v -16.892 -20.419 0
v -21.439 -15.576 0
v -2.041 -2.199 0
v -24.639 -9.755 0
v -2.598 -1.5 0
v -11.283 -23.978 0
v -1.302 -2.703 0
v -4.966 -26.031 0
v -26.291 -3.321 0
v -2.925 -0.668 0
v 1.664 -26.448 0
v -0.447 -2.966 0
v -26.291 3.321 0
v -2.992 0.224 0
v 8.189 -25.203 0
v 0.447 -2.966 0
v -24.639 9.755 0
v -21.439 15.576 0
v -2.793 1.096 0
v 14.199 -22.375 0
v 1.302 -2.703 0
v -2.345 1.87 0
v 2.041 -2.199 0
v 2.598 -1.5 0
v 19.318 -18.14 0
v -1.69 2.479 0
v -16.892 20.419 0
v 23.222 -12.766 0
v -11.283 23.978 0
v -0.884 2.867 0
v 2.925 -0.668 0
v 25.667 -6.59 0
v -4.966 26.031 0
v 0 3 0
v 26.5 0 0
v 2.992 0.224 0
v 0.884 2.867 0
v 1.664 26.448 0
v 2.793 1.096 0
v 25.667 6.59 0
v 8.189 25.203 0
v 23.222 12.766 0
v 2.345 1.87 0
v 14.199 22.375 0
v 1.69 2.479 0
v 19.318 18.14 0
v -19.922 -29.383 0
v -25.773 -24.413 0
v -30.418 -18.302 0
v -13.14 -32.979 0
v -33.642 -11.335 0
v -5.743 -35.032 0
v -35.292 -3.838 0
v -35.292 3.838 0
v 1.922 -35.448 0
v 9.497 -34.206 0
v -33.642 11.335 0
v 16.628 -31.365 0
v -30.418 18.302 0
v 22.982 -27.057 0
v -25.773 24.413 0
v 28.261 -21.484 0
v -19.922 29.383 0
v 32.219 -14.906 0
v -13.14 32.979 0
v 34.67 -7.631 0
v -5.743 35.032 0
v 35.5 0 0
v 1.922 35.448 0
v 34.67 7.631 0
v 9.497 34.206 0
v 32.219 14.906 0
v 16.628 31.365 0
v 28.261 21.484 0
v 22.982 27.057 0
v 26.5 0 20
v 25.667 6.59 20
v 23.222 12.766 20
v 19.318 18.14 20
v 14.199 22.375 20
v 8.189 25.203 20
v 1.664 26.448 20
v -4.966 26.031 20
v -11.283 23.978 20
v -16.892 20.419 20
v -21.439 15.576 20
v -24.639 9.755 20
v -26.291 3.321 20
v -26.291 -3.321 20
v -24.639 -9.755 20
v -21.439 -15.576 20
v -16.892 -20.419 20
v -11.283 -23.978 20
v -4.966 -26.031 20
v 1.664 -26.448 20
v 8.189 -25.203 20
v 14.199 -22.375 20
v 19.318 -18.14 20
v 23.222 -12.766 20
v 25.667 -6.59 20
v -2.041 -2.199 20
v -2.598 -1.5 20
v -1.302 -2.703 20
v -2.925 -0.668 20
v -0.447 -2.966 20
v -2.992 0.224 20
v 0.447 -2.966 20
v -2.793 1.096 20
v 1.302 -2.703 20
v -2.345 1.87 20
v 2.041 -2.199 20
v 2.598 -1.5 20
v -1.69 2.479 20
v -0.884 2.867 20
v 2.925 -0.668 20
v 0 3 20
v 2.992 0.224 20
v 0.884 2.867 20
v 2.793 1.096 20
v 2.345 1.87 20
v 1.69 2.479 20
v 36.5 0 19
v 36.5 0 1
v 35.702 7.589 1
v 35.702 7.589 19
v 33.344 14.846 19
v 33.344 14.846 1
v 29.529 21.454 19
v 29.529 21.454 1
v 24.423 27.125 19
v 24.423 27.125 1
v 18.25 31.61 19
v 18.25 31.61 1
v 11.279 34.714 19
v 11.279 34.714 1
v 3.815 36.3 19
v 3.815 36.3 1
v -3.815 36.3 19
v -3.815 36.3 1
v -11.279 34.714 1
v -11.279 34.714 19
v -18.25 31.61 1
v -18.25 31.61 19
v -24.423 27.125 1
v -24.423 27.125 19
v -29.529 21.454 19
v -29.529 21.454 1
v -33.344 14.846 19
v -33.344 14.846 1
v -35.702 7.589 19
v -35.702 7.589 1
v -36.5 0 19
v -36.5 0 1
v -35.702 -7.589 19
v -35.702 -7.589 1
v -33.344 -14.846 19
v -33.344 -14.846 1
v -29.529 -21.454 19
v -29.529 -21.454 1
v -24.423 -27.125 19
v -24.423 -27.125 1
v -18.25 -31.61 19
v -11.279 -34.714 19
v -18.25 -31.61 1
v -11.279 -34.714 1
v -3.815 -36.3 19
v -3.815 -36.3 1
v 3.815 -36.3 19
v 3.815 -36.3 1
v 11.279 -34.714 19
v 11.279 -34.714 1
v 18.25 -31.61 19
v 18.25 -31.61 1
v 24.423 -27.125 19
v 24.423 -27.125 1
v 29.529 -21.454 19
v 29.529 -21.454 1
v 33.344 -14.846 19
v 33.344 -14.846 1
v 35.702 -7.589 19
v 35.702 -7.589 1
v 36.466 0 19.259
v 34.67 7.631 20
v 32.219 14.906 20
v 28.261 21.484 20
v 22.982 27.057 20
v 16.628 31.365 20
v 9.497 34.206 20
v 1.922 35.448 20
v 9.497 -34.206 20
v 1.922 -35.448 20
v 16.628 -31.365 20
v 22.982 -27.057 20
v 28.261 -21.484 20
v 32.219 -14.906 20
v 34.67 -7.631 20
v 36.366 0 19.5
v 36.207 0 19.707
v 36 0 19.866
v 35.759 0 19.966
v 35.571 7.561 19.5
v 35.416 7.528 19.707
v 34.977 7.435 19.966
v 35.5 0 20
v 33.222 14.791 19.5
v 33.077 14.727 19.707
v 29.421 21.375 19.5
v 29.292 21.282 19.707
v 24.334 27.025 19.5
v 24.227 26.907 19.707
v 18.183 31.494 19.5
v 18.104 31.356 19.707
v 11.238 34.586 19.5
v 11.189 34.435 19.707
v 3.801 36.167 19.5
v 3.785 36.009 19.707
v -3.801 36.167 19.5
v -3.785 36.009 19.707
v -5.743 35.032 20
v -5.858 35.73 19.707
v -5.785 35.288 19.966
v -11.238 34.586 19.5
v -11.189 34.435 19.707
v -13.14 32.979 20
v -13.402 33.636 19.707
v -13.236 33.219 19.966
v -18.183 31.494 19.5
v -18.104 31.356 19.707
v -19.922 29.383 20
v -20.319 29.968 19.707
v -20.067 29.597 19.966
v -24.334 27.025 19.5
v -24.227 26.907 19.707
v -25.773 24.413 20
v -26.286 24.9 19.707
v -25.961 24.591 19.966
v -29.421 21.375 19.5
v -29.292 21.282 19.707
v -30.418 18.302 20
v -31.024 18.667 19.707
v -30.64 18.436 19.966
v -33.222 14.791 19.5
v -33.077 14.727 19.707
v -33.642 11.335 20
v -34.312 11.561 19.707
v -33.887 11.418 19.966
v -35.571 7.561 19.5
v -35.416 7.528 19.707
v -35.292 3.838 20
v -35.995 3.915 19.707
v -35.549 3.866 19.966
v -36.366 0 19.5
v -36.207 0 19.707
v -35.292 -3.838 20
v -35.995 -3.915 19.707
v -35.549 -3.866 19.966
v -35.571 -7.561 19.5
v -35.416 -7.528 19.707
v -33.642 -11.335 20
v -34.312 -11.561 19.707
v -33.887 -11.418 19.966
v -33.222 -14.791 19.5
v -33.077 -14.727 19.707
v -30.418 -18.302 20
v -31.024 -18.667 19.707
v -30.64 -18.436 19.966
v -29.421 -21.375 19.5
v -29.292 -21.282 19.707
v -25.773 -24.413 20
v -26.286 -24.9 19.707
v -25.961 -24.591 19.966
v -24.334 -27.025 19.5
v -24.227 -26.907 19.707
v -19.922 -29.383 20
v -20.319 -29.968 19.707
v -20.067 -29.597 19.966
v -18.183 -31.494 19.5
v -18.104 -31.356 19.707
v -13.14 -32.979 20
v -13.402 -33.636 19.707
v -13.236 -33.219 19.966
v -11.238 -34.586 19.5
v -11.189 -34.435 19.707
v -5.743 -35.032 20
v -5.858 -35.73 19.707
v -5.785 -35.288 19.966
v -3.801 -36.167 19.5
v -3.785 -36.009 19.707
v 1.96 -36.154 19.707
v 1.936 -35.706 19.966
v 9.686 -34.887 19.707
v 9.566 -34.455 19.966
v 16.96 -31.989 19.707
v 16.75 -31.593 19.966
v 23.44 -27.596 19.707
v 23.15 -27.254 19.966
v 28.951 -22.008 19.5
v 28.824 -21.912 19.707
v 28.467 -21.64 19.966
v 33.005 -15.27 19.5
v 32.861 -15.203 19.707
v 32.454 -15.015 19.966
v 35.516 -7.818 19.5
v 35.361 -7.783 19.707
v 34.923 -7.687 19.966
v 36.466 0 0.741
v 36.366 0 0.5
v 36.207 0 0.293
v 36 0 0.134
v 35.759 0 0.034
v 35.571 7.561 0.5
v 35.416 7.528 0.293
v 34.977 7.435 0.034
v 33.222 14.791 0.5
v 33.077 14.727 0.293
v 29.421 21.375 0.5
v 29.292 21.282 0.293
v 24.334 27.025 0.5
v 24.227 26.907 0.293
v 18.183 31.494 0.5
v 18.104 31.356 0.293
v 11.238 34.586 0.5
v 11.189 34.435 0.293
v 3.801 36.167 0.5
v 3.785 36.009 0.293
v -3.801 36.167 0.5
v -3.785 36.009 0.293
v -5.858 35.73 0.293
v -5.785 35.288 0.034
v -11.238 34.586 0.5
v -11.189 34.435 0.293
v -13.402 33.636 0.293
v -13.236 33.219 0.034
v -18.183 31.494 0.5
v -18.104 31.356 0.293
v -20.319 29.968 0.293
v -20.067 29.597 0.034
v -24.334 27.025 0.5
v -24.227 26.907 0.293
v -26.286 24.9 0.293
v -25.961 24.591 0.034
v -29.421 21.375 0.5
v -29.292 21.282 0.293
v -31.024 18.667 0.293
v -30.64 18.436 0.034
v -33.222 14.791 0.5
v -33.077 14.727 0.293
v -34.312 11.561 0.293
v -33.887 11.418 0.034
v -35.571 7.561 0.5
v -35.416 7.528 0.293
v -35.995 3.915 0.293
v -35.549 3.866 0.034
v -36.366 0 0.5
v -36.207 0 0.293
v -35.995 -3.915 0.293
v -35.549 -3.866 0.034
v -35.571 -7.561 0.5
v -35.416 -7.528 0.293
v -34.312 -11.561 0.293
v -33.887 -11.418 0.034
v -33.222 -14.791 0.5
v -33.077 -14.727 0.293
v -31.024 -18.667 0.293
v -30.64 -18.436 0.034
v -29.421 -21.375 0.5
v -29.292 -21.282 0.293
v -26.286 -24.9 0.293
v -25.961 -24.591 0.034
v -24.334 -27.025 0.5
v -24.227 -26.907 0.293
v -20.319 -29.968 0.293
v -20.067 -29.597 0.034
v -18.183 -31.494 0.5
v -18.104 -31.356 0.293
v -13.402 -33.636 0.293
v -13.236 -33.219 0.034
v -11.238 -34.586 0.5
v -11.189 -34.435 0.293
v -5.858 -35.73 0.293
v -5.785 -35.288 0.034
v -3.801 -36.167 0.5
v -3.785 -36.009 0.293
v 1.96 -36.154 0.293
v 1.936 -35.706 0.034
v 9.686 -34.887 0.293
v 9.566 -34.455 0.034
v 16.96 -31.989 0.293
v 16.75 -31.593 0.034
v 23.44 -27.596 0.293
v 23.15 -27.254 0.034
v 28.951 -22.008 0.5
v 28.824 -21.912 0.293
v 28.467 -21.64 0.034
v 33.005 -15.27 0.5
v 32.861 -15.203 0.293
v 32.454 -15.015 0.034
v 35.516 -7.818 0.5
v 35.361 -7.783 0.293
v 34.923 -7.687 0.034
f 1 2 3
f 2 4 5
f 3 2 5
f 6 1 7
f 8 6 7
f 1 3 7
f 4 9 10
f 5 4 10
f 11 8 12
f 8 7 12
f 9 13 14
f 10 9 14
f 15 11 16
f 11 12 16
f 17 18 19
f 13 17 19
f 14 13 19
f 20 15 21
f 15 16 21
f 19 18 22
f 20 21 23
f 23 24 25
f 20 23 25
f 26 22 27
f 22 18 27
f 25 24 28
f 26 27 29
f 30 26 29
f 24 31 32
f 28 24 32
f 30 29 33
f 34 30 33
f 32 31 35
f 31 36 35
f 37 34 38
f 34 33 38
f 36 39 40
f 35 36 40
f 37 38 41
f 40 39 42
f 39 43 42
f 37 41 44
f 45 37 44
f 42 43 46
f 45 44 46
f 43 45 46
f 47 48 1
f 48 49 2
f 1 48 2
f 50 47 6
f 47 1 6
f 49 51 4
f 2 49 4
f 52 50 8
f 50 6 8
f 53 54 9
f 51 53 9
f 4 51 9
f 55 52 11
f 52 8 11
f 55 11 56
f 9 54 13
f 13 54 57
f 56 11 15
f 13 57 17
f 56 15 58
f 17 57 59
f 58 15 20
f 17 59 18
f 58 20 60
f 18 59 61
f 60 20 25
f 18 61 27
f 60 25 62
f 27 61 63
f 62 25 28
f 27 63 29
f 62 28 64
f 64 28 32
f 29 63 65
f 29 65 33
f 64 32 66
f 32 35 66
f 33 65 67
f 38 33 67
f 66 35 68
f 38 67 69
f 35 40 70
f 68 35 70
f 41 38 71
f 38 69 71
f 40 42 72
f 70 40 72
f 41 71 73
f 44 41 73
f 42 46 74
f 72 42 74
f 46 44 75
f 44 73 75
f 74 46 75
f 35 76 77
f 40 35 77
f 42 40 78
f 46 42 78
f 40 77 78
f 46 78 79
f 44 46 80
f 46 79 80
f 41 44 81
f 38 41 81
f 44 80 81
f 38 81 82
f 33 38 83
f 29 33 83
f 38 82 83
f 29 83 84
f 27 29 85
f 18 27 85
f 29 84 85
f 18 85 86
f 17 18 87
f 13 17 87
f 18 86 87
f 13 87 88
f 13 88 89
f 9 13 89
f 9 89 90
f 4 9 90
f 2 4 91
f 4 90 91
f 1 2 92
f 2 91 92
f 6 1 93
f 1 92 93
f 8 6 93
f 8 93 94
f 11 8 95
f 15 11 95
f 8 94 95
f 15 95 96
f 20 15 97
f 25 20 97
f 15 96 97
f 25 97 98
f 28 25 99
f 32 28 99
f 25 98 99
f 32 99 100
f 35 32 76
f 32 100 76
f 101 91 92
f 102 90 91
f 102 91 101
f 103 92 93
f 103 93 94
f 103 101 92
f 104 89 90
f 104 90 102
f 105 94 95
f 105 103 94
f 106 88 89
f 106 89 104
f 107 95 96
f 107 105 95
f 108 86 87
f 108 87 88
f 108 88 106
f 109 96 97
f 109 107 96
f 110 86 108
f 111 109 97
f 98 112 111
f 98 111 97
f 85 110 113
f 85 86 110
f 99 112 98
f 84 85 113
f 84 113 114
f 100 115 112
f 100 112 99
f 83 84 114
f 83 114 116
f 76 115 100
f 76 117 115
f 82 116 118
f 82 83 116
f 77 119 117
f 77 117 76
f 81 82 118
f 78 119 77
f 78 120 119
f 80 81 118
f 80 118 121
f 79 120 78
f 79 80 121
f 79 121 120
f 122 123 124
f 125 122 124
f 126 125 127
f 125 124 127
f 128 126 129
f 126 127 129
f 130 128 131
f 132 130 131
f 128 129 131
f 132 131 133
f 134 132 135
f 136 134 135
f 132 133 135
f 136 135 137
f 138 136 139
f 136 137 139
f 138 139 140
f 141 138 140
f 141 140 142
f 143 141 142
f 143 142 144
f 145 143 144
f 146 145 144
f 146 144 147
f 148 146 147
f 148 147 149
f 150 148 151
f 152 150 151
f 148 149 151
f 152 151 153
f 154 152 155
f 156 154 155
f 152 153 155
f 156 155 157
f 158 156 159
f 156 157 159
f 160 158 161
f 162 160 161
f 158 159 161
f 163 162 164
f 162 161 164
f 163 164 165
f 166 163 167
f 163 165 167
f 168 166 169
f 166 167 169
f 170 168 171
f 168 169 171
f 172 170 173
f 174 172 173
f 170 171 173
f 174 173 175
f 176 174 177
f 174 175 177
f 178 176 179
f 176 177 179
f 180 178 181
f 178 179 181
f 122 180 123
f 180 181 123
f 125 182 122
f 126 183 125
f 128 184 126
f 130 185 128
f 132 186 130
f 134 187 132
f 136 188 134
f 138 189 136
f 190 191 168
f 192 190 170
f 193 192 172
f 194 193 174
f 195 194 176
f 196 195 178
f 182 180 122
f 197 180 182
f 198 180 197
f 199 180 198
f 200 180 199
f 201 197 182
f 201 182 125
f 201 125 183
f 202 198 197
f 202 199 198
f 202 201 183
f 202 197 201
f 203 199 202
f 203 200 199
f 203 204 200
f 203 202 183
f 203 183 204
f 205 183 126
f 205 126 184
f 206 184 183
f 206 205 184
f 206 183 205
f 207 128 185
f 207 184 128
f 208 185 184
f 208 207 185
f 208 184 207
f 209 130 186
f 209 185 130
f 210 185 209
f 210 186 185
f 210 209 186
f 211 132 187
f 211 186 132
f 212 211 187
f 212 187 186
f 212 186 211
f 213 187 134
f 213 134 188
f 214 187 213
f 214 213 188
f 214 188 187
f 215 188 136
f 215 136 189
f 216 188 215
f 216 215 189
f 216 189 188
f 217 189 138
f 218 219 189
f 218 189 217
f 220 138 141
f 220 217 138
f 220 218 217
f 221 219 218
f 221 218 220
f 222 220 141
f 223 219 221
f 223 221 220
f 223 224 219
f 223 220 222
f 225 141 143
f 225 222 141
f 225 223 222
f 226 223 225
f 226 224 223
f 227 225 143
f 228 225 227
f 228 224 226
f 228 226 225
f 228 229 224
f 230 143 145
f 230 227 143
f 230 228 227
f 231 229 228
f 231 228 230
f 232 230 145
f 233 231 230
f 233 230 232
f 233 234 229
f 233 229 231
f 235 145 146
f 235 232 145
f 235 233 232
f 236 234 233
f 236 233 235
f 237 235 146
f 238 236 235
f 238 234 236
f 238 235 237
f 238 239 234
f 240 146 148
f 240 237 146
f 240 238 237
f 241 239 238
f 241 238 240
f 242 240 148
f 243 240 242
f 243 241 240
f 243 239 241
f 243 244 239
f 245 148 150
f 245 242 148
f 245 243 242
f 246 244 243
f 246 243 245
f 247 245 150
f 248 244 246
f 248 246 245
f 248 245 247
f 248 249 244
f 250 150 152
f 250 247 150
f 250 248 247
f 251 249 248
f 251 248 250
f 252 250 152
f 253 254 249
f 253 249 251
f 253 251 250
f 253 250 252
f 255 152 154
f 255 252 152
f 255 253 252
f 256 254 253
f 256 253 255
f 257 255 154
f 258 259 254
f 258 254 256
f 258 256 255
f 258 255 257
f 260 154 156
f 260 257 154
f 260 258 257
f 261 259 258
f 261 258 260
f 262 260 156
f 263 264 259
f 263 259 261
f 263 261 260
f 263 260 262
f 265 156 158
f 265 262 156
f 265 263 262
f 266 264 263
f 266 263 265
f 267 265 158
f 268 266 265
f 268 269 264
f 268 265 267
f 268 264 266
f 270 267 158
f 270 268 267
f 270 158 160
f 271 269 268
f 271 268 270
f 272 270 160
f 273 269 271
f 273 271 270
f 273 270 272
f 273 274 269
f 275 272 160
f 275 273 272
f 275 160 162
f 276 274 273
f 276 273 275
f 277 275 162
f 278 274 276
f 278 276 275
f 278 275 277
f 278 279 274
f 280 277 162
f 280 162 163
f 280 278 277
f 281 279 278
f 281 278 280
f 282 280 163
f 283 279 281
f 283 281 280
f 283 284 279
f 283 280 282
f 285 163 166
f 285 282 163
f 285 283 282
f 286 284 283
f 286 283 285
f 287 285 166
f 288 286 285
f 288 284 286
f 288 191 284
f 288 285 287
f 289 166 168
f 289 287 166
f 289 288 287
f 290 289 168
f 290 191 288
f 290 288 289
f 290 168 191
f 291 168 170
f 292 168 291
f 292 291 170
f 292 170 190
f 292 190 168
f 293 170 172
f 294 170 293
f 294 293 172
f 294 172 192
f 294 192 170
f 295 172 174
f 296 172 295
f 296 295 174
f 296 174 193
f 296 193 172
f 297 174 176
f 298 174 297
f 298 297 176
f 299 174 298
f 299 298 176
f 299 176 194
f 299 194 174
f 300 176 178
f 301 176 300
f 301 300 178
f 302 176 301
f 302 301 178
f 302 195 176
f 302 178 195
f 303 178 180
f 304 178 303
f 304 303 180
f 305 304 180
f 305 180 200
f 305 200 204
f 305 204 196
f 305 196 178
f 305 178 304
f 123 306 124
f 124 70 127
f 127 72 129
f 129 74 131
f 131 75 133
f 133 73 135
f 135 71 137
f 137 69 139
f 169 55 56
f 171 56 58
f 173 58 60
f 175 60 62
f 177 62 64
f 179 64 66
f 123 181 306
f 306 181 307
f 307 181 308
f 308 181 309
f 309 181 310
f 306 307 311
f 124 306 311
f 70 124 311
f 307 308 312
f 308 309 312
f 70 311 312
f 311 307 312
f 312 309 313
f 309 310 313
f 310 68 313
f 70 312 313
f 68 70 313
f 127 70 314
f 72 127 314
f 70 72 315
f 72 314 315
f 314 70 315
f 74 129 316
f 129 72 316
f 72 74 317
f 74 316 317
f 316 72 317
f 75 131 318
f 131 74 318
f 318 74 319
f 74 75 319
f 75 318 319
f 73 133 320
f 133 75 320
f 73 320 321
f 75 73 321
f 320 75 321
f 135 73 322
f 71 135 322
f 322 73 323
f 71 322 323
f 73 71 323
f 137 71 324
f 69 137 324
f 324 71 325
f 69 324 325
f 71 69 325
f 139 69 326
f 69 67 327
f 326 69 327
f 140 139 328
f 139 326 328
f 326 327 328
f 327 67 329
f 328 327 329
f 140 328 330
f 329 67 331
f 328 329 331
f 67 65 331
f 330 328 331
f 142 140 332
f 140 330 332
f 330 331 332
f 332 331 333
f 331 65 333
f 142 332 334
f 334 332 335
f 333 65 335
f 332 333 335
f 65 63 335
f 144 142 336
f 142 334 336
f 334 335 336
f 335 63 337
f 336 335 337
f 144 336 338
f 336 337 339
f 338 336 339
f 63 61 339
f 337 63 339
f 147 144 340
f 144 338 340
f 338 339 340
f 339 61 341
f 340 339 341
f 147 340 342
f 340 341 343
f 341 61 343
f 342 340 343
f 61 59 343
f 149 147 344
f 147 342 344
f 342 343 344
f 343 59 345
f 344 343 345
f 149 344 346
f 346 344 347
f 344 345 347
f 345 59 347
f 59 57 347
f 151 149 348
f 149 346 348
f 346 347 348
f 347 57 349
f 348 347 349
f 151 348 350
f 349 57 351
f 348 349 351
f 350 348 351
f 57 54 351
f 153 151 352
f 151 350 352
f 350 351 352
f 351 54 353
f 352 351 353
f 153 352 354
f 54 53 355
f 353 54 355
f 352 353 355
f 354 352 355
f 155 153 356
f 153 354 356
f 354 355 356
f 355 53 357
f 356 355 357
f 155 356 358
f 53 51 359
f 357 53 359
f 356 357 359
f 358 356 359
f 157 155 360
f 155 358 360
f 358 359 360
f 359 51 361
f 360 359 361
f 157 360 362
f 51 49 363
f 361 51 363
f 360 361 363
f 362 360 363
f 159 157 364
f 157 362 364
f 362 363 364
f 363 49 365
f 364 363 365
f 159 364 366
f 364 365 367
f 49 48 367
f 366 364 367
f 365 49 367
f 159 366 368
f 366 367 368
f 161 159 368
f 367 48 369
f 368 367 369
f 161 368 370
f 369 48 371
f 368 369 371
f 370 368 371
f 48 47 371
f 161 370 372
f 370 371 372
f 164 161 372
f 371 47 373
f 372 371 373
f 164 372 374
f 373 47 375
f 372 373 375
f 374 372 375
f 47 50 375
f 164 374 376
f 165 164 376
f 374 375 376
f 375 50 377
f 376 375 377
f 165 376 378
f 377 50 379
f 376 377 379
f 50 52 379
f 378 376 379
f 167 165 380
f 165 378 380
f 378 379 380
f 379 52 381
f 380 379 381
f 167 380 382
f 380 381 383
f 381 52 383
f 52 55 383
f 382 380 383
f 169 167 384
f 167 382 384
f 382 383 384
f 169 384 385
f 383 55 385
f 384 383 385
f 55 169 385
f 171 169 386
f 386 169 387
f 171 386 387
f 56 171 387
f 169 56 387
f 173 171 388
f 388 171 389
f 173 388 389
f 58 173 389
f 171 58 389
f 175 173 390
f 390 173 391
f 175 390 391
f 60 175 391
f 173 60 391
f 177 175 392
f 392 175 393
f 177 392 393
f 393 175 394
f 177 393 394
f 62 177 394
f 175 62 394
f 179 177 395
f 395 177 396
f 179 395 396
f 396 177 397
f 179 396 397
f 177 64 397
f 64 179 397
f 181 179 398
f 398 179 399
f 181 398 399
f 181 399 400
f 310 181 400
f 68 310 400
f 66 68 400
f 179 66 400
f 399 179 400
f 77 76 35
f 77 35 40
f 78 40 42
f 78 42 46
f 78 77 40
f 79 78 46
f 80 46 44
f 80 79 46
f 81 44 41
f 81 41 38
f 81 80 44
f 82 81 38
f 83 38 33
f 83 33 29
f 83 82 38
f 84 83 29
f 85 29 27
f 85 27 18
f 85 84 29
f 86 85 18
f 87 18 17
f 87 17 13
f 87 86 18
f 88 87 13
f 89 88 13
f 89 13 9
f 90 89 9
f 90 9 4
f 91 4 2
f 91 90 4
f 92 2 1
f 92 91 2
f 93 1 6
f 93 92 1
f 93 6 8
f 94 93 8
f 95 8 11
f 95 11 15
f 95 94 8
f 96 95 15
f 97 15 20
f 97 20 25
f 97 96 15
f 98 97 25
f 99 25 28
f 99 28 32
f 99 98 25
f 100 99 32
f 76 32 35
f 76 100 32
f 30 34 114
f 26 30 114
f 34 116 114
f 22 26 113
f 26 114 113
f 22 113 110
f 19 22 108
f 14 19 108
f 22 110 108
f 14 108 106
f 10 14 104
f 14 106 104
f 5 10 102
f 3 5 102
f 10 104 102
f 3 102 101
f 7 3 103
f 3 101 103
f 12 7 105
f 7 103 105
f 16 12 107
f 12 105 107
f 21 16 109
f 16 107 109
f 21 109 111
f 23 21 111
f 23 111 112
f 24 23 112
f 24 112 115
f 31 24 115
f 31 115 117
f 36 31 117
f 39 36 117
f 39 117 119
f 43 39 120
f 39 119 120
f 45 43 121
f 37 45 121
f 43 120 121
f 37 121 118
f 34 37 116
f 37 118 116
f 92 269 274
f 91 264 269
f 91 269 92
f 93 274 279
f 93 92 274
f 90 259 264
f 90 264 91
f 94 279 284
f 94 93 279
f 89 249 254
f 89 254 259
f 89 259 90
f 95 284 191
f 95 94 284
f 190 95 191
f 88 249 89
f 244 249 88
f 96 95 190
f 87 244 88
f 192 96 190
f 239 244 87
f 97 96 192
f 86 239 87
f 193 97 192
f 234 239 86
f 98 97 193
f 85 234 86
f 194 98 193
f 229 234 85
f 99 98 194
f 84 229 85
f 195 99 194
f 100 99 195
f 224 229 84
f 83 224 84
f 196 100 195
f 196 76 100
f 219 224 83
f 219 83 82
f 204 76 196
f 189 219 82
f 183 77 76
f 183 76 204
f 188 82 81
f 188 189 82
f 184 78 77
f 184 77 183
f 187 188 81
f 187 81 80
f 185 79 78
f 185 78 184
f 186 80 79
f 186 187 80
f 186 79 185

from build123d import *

# Parameters (mm, degrees)
ESQUISSE1_R             = 36.5
BOSS_EXTRU_1_DEPTH      = 20
ESQUISSE2_R             = 26.5
ENL_V_MAT_EXTRU_2_DEPTH = 20
ESQUISSE4_R             = 26.5
BOSS_EXTRU_3_DEPTH      = 20
ESQUISSE9_W             = 3
ESQUISSE9_H             = 20
CONG_1_R                = 1


with BuildPart() as part:
    # Esquisse1 → Boss.-Extru.1 (new body)
    with BuildSketch(Plane.XY):
        Circle(ESQUISSE1_R)
    extrude(amount=BOSS_EXTRU_1_DEPTH)

    # Esquisse2 → Enlèv. mat.-Extru.2 (cut)
    with BuildSketch(Plane.XY.offset(20)):
        Circle(ESQUISSE2_R)
    extrude(amount=-ENL_V_MAT_EXTRU_2_DEPTH, mode=Mode.SUBTRACT)

    # Congé1
    cong_1_edges = [part.edges().sort_by_distance(p)[0] for p in [
        (-36.5, 0, 0),
        (-36.5, 0, 20),
    ]]
    fillet(cong_1_edges, radius=CONG_1_R)


with BuildPart() as body_2:
    # Esquisse4 → Boss.-Extru.3 (new body)
    with BuildSketch(Plane.XY.offset(20)):
        Circle(ESQUISSE4_R)
    extrude(amount=-BOSS_EXTRU_3_DEPTH)

    # Esquisse9 → Dégagement M81 (revolve, cut)
    with BuildSketch(Plane.YZ):
        with Locations((1.5, 10)):
            Rectangle(ESQUISSE9_W, ESQUISSE9_H)
    revolve(axis=Axis((0, 0, -6.35), (0, 0, 1)), mode=Mode.SUBTRACT)


solid = Compound([part.part, body_2.part])
